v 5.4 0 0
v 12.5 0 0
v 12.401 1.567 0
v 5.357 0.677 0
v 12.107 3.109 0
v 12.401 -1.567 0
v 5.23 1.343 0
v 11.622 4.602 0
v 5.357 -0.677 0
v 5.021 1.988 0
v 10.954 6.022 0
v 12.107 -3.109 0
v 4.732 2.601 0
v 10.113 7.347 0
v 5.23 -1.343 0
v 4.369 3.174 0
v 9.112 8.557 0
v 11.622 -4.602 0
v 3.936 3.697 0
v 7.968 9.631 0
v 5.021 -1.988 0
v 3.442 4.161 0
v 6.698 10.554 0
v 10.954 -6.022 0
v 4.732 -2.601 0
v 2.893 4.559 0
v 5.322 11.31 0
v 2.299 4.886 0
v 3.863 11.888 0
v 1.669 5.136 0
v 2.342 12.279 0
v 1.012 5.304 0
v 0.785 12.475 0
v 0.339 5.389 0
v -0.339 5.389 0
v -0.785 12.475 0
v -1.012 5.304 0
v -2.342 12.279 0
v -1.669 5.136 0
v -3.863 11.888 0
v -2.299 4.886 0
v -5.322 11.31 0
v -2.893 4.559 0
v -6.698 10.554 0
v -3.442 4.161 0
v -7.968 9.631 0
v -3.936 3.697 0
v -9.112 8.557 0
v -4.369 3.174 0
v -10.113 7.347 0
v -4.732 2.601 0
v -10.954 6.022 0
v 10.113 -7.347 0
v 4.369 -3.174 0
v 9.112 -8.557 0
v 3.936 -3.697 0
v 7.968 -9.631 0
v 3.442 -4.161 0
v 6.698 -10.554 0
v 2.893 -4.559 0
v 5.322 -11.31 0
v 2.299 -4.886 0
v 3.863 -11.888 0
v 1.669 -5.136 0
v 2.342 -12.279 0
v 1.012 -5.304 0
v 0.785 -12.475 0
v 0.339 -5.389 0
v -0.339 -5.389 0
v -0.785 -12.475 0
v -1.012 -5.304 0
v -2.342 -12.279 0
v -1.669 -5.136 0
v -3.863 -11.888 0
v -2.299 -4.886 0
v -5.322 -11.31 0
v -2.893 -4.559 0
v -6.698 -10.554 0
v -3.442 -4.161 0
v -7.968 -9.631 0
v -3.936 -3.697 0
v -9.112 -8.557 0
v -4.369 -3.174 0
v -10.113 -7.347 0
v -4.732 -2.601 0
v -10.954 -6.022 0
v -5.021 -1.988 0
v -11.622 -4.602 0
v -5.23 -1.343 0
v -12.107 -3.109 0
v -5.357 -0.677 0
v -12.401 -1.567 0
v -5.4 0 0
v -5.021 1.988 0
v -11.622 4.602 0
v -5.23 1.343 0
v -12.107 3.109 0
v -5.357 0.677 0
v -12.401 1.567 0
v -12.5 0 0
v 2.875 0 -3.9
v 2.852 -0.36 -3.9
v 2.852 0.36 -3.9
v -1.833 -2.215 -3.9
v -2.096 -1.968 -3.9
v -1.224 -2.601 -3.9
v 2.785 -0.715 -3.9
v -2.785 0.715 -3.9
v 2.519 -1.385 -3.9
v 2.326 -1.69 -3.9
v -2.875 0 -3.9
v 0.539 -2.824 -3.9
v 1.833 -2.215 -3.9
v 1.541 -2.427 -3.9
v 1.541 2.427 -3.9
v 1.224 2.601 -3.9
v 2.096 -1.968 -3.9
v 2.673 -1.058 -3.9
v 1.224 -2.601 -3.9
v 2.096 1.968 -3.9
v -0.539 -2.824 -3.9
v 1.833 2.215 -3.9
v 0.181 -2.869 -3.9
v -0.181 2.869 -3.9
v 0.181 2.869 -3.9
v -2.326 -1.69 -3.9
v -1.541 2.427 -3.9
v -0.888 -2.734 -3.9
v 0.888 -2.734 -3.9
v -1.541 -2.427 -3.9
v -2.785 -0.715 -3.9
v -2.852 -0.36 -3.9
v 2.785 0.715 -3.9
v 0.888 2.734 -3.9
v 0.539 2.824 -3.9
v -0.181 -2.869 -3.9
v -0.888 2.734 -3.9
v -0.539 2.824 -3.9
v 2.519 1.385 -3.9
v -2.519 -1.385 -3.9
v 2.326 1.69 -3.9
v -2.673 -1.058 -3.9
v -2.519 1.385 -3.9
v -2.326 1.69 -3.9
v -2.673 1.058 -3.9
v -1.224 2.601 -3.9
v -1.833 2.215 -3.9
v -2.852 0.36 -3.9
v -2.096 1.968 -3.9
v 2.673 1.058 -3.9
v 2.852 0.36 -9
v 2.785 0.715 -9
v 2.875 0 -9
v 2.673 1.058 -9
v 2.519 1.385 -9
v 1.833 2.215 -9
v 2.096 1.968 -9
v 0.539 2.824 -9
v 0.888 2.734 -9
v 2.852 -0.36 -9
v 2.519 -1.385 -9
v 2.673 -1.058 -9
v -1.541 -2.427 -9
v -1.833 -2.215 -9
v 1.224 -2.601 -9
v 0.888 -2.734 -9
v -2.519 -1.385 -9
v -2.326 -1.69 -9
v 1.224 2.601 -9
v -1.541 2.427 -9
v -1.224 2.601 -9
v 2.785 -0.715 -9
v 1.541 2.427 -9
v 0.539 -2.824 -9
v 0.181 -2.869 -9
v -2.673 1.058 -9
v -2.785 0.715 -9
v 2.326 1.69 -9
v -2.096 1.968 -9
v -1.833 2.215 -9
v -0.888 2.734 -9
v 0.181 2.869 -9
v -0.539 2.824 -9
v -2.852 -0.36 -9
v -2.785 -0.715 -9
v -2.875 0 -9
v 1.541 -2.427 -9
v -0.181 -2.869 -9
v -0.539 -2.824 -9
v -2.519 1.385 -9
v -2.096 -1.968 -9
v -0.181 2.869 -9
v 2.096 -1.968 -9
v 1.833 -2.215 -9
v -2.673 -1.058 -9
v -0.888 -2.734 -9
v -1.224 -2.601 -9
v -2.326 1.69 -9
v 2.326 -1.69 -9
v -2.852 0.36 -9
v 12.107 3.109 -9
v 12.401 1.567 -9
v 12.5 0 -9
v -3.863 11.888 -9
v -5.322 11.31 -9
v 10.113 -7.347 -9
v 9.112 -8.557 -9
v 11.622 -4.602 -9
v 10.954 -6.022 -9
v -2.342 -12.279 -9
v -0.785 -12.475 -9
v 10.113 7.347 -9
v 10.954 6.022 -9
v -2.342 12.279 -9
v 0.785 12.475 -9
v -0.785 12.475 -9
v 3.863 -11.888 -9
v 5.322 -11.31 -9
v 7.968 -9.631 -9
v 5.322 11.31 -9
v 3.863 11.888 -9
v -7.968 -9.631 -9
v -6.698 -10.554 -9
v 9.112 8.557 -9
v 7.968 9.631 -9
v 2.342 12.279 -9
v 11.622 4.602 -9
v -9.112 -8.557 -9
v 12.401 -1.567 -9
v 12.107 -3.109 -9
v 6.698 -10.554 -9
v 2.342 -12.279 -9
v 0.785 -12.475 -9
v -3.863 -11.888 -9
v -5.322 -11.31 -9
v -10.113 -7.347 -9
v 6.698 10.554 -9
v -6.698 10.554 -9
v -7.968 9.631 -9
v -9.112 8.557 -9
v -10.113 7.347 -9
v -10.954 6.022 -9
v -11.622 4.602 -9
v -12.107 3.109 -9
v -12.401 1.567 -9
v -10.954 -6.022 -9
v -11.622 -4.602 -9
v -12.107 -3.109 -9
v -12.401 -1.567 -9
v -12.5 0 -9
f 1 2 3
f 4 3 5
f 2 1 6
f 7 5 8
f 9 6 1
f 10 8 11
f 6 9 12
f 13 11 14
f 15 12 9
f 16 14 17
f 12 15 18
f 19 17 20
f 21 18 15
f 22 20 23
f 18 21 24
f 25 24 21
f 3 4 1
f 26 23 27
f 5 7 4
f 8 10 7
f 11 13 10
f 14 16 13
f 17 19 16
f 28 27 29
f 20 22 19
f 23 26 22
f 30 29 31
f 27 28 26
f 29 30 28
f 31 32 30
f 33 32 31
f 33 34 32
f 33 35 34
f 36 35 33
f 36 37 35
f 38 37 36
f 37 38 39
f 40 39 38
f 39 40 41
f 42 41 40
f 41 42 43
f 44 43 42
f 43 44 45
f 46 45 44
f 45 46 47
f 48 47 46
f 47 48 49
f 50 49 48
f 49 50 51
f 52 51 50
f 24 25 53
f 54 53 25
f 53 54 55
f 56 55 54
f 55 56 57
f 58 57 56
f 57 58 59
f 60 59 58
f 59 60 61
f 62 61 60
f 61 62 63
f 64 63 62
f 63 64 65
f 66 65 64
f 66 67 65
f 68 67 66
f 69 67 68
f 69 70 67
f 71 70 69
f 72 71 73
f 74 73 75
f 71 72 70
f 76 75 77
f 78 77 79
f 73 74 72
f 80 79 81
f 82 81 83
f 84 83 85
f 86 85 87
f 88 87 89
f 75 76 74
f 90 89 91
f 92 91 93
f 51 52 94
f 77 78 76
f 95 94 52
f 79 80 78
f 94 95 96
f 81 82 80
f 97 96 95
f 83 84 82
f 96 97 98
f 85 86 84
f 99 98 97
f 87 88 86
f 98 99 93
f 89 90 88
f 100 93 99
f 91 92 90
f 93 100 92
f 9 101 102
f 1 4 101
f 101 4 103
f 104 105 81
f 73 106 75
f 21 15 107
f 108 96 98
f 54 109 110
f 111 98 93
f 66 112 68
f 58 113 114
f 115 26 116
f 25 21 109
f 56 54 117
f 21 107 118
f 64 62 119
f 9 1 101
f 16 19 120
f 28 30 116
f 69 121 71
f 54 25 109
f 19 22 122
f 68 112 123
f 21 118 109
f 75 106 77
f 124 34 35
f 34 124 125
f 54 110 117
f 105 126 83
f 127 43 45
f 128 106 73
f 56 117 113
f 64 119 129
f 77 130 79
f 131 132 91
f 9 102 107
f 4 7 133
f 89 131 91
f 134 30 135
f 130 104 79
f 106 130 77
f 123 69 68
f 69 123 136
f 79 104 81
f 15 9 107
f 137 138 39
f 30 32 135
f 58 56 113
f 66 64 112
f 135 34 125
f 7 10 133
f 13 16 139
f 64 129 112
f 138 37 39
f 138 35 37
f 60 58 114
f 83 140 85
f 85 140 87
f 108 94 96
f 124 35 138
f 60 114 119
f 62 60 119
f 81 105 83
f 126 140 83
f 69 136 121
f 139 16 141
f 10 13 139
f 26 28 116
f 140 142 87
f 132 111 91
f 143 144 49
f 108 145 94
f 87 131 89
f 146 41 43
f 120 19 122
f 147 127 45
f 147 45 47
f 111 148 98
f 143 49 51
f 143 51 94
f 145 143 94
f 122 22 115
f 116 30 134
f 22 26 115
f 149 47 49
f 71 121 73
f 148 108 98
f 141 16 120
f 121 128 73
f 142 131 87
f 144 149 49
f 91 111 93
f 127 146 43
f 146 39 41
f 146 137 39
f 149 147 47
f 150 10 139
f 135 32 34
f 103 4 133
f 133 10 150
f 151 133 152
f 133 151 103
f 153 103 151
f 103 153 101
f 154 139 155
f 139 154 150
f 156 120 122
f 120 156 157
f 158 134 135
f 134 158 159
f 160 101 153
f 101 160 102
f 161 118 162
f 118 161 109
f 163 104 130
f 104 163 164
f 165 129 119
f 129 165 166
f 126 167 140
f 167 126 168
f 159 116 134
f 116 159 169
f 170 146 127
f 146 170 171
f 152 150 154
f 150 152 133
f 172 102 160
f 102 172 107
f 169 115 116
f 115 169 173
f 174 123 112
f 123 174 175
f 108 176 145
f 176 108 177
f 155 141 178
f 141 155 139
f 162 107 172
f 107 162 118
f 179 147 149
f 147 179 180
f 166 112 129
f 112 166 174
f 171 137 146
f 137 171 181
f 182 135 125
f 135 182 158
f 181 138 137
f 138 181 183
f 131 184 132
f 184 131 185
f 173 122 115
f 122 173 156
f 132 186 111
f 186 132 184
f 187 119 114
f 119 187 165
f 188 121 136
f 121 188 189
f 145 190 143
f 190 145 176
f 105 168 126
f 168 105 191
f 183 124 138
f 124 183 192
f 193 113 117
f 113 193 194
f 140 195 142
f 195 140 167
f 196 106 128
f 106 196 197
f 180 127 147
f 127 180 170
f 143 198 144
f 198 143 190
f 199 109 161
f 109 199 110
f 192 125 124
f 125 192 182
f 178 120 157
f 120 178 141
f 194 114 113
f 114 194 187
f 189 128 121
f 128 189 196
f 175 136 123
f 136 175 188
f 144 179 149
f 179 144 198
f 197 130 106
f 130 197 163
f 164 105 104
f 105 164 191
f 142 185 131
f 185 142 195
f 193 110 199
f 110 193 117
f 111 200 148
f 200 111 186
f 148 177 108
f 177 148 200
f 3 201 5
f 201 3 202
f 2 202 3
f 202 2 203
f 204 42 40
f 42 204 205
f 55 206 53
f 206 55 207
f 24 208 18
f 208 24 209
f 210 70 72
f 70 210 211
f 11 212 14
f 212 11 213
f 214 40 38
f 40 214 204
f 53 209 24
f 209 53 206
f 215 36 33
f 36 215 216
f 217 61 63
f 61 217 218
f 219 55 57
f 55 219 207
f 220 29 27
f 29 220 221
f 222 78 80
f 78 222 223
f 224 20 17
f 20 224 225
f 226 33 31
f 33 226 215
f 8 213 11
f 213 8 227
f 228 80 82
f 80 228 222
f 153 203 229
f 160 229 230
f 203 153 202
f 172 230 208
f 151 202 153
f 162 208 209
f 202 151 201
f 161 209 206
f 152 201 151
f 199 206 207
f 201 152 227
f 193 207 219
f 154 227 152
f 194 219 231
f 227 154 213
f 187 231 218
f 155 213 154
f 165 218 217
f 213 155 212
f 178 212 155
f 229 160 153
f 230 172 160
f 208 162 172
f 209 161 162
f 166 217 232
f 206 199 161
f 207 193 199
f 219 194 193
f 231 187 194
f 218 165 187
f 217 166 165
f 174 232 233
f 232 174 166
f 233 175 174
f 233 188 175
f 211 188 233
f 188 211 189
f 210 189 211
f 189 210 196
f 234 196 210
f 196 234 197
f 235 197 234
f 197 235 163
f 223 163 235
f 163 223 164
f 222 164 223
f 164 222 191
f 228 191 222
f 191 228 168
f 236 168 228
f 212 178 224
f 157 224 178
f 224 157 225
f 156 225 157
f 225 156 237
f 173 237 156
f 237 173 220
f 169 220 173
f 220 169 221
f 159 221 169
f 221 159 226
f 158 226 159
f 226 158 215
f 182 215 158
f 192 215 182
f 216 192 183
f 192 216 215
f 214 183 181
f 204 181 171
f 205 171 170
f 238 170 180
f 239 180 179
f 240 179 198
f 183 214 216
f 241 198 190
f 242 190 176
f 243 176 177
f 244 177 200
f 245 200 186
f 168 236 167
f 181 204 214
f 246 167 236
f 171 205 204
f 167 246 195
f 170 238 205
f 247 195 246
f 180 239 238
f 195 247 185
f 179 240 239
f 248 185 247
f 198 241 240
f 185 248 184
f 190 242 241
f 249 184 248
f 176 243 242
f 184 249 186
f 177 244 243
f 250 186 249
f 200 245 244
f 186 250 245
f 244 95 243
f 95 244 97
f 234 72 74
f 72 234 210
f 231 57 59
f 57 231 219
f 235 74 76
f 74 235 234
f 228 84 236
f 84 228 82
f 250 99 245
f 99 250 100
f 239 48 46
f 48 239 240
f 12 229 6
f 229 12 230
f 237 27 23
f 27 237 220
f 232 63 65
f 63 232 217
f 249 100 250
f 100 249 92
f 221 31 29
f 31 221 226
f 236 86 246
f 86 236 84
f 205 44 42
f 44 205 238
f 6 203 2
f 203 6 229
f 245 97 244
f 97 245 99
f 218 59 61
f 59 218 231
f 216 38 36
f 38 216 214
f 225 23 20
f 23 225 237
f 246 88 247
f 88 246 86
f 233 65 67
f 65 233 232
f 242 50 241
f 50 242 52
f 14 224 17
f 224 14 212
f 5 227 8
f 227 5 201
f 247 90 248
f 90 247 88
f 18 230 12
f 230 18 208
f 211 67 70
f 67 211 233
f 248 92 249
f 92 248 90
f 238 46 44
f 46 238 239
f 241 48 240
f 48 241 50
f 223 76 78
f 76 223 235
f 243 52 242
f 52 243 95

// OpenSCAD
$fn = 50;

difference() {
	union() {
		translate(v = [0, 0, -9.0]) {
			cylinder(h = 9, r = 12.5);
		}
	}
	union() {
		translate(v = [0, 0, 0]) {
			rotate(a = [0, 0, 0]) {
				difference() {
					union() {
						translate(v = [0, 0, -12.0]) {
							cylinder(h = 12, r = 2.6);
						}
						translate(v = [0, 0, -3.9]) {
							cylinder(h = 3.9, r1 = 2.875, r2 = 5.4);
						}
						translate(v = [0, 0, -12.0]) {
							cylinder(h = 12, r = 2.875);
						}
						translate(v = [0, 0, -12.0]) {
							cylinder(h = 12, r = 2.6);
						}
					}
					union();
				}
			}
		}
	}
}
